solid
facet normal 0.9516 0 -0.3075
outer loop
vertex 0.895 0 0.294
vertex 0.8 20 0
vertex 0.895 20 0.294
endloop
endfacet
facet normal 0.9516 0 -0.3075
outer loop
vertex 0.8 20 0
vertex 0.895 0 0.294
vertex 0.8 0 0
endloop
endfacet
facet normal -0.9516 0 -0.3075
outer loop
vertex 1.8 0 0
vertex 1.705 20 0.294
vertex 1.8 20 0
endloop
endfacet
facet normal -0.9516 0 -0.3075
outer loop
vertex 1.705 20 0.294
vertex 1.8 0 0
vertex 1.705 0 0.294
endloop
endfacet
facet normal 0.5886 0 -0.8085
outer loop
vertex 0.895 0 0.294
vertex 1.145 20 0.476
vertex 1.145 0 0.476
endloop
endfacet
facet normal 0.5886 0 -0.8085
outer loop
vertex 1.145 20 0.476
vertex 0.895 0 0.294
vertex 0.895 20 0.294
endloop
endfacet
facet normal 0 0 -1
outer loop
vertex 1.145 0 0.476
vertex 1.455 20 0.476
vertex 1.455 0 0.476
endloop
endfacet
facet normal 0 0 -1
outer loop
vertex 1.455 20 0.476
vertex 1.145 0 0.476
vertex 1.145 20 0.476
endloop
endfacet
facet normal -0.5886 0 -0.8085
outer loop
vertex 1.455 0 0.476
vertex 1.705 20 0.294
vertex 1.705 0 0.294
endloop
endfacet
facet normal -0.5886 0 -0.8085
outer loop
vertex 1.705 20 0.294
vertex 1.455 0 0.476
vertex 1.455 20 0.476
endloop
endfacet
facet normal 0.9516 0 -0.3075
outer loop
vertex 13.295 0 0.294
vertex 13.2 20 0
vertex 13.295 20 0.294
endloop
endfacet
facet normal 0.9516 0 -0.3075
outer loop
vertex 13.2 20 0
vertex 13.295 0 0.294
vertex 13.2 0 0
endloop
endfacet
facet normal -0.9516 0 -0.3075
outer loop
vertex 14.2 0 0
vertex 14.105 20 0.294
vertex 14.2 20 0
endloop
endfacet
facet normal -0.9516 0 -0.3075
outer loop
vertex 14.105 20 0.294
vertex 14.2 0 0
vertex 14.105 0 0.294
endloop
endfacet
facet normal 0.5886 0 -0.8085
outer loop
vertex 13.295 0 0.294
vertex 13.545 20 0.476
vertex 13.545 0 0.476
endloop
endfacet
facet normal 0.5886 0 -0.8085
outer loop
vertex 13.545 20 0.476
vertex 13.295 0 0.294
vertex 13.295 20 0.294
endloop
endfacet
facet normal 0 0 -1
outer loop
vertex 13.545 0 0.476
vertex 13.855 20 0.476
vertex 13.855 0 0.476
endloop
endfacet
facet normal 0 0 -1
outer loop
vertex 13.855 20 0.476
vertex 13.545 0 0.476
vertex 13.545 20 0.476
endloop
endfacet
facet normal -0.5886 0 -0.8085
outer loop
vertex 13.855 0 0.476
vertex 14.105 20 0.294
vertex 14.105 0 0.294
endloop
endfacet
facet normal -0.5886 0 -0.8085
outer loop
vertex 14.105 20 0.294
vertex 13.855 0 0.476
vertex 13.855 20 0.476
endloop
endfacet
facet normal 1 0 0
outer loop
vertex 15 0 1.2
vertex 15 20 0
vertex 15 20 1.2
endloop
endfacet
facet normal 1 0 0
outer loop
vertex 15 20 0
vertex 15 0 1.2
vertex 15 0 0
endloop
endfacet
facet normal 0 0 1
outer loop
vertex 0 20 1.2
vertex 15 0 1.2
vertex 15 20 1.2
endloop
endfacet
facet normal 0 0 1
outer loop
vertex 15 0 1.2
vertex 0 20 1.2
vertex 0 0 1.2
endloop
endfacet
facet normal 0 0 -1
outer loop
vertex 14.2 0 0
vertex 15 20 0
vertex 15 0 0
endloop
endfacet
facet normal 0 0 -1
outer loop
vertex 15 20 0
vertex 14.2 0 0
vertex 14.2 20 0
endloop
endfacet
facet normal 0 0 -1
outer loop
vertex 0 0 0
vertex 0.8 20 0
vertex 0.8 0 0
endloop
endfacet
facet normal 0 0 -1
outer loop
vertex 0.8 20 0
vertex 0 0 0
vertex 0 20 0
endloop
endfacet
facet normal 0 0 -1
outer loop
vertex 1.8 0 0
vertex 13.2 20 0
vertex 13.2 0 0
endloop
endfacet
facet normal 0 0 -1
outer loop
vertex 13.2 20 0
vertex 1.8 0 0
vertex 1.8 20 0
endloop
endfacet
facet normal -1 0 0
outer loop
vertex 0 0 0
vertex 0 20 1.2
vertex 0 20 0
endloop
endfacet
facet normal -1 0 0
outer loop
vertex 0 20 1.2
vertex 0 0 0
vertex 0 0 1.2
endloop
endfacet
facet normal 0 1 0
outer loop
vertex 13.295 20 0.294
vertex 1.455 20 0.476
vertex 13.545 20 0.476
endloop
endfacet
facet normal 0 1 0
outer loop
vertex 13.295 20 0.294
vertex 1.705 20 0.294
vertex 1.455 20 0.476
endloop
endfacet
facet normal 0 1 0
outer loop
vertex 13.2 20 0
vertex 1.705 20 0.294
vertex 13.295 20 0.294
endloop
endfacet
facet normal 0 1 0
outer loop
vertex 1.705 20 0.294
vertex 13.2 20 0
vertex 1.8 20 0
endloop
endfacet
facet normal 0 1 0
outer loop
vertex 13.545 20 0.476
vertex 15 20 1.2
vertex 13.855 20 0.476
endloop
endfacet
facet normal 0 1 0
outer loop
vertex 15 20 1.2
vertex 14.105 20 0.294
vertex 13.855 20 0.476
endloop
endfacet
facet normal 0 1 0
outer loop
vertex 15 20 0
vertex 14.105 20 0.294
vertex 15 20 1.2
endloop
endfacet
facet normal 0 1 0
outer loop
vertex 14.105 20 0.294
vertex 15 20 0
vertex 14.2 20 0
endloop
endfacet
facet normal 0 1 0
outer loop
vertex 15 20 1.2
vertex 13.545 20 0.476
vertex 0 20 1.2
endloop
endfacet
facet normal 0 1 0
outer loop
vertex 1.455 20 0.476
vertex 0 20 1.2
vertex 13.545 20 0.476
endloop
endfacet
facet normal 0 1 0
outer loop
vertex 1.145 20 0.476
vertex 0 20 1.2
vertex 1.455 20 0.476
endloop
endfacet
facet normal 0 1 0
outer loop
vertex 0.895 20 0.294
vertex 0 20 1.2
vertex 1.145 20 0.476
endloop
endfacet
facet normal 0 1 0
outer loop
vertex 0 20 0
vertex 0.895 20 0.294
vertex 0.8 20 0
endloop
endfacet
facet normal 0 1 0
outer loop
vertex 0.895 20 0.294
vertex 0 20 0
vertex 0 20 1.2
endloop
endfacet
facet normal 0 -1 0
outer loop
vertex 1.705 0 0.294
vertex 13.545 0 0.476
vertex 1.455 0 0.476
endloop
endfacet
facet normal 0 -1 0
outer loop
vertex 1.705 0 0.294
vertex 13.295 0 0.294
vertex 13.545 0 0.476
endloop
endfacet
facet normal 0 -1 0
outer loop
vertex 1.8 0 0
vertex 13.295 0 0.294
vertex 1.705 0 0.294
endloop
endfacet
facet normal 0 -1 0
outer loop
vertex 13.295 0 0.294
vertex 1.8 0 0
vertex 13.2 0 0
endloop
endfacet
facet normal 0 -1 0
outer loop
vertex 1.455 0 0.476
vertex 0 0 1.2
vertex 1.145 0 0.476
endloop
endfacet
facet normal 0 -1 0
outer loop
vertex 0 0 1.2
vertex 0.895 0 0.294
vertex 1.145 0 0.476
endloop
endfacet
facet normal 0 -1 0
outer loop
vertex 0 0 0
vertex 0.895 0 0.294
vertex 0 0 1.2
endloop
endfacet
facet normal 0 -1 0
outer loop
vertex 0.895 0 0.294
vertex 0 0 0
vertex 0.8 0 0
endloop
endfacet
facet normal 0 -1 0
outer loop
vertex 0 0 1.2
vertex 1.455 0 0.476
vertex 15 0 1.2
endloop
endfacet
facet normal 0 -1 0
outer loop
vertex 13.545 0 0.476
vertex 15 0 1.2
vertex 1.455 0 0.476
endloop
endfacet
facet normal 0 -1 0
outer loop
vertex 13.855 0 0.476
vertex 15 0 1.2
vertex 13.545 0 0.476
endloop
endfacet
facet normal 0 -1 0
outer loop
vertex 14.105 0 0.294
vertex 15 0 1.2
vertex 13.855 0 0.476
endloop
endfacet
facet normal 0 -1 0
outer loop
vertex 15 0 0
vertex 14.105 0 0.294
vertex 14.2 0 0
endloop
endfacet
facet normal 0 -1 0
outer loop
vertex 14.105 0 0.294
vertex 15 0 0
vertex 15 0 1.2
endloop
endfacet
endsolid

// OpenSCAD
// Total width of the chain pieces
chainWidth = 15;
// Length of one of the chain pieces
chainLength = 20;

// Thickness of the base of the chain
baseThickness = 1.2;
// Diameter of the wire used for the chain
wireDiameter = 1;
// Number of wires used 
wireAmount = 2;

// Spacing of the wire from the outer edge of the chain
wireSpacing = 1.3;


module wires() {
	$fn = 10;
	for(i = [0:wireAmount - 1]) {
		translate([wireSpacing + i * (chainWidth - wireSpacing *2), -0.5, 0]) rotate([-90, 0, 0]) cylinder(d = wireDiameter, h = chainLength + 1);
	}
}

module base() {
	difference() {
		cube([chainWidth, chainLength, baseThickness]);
		wires();
	}
}

base();
